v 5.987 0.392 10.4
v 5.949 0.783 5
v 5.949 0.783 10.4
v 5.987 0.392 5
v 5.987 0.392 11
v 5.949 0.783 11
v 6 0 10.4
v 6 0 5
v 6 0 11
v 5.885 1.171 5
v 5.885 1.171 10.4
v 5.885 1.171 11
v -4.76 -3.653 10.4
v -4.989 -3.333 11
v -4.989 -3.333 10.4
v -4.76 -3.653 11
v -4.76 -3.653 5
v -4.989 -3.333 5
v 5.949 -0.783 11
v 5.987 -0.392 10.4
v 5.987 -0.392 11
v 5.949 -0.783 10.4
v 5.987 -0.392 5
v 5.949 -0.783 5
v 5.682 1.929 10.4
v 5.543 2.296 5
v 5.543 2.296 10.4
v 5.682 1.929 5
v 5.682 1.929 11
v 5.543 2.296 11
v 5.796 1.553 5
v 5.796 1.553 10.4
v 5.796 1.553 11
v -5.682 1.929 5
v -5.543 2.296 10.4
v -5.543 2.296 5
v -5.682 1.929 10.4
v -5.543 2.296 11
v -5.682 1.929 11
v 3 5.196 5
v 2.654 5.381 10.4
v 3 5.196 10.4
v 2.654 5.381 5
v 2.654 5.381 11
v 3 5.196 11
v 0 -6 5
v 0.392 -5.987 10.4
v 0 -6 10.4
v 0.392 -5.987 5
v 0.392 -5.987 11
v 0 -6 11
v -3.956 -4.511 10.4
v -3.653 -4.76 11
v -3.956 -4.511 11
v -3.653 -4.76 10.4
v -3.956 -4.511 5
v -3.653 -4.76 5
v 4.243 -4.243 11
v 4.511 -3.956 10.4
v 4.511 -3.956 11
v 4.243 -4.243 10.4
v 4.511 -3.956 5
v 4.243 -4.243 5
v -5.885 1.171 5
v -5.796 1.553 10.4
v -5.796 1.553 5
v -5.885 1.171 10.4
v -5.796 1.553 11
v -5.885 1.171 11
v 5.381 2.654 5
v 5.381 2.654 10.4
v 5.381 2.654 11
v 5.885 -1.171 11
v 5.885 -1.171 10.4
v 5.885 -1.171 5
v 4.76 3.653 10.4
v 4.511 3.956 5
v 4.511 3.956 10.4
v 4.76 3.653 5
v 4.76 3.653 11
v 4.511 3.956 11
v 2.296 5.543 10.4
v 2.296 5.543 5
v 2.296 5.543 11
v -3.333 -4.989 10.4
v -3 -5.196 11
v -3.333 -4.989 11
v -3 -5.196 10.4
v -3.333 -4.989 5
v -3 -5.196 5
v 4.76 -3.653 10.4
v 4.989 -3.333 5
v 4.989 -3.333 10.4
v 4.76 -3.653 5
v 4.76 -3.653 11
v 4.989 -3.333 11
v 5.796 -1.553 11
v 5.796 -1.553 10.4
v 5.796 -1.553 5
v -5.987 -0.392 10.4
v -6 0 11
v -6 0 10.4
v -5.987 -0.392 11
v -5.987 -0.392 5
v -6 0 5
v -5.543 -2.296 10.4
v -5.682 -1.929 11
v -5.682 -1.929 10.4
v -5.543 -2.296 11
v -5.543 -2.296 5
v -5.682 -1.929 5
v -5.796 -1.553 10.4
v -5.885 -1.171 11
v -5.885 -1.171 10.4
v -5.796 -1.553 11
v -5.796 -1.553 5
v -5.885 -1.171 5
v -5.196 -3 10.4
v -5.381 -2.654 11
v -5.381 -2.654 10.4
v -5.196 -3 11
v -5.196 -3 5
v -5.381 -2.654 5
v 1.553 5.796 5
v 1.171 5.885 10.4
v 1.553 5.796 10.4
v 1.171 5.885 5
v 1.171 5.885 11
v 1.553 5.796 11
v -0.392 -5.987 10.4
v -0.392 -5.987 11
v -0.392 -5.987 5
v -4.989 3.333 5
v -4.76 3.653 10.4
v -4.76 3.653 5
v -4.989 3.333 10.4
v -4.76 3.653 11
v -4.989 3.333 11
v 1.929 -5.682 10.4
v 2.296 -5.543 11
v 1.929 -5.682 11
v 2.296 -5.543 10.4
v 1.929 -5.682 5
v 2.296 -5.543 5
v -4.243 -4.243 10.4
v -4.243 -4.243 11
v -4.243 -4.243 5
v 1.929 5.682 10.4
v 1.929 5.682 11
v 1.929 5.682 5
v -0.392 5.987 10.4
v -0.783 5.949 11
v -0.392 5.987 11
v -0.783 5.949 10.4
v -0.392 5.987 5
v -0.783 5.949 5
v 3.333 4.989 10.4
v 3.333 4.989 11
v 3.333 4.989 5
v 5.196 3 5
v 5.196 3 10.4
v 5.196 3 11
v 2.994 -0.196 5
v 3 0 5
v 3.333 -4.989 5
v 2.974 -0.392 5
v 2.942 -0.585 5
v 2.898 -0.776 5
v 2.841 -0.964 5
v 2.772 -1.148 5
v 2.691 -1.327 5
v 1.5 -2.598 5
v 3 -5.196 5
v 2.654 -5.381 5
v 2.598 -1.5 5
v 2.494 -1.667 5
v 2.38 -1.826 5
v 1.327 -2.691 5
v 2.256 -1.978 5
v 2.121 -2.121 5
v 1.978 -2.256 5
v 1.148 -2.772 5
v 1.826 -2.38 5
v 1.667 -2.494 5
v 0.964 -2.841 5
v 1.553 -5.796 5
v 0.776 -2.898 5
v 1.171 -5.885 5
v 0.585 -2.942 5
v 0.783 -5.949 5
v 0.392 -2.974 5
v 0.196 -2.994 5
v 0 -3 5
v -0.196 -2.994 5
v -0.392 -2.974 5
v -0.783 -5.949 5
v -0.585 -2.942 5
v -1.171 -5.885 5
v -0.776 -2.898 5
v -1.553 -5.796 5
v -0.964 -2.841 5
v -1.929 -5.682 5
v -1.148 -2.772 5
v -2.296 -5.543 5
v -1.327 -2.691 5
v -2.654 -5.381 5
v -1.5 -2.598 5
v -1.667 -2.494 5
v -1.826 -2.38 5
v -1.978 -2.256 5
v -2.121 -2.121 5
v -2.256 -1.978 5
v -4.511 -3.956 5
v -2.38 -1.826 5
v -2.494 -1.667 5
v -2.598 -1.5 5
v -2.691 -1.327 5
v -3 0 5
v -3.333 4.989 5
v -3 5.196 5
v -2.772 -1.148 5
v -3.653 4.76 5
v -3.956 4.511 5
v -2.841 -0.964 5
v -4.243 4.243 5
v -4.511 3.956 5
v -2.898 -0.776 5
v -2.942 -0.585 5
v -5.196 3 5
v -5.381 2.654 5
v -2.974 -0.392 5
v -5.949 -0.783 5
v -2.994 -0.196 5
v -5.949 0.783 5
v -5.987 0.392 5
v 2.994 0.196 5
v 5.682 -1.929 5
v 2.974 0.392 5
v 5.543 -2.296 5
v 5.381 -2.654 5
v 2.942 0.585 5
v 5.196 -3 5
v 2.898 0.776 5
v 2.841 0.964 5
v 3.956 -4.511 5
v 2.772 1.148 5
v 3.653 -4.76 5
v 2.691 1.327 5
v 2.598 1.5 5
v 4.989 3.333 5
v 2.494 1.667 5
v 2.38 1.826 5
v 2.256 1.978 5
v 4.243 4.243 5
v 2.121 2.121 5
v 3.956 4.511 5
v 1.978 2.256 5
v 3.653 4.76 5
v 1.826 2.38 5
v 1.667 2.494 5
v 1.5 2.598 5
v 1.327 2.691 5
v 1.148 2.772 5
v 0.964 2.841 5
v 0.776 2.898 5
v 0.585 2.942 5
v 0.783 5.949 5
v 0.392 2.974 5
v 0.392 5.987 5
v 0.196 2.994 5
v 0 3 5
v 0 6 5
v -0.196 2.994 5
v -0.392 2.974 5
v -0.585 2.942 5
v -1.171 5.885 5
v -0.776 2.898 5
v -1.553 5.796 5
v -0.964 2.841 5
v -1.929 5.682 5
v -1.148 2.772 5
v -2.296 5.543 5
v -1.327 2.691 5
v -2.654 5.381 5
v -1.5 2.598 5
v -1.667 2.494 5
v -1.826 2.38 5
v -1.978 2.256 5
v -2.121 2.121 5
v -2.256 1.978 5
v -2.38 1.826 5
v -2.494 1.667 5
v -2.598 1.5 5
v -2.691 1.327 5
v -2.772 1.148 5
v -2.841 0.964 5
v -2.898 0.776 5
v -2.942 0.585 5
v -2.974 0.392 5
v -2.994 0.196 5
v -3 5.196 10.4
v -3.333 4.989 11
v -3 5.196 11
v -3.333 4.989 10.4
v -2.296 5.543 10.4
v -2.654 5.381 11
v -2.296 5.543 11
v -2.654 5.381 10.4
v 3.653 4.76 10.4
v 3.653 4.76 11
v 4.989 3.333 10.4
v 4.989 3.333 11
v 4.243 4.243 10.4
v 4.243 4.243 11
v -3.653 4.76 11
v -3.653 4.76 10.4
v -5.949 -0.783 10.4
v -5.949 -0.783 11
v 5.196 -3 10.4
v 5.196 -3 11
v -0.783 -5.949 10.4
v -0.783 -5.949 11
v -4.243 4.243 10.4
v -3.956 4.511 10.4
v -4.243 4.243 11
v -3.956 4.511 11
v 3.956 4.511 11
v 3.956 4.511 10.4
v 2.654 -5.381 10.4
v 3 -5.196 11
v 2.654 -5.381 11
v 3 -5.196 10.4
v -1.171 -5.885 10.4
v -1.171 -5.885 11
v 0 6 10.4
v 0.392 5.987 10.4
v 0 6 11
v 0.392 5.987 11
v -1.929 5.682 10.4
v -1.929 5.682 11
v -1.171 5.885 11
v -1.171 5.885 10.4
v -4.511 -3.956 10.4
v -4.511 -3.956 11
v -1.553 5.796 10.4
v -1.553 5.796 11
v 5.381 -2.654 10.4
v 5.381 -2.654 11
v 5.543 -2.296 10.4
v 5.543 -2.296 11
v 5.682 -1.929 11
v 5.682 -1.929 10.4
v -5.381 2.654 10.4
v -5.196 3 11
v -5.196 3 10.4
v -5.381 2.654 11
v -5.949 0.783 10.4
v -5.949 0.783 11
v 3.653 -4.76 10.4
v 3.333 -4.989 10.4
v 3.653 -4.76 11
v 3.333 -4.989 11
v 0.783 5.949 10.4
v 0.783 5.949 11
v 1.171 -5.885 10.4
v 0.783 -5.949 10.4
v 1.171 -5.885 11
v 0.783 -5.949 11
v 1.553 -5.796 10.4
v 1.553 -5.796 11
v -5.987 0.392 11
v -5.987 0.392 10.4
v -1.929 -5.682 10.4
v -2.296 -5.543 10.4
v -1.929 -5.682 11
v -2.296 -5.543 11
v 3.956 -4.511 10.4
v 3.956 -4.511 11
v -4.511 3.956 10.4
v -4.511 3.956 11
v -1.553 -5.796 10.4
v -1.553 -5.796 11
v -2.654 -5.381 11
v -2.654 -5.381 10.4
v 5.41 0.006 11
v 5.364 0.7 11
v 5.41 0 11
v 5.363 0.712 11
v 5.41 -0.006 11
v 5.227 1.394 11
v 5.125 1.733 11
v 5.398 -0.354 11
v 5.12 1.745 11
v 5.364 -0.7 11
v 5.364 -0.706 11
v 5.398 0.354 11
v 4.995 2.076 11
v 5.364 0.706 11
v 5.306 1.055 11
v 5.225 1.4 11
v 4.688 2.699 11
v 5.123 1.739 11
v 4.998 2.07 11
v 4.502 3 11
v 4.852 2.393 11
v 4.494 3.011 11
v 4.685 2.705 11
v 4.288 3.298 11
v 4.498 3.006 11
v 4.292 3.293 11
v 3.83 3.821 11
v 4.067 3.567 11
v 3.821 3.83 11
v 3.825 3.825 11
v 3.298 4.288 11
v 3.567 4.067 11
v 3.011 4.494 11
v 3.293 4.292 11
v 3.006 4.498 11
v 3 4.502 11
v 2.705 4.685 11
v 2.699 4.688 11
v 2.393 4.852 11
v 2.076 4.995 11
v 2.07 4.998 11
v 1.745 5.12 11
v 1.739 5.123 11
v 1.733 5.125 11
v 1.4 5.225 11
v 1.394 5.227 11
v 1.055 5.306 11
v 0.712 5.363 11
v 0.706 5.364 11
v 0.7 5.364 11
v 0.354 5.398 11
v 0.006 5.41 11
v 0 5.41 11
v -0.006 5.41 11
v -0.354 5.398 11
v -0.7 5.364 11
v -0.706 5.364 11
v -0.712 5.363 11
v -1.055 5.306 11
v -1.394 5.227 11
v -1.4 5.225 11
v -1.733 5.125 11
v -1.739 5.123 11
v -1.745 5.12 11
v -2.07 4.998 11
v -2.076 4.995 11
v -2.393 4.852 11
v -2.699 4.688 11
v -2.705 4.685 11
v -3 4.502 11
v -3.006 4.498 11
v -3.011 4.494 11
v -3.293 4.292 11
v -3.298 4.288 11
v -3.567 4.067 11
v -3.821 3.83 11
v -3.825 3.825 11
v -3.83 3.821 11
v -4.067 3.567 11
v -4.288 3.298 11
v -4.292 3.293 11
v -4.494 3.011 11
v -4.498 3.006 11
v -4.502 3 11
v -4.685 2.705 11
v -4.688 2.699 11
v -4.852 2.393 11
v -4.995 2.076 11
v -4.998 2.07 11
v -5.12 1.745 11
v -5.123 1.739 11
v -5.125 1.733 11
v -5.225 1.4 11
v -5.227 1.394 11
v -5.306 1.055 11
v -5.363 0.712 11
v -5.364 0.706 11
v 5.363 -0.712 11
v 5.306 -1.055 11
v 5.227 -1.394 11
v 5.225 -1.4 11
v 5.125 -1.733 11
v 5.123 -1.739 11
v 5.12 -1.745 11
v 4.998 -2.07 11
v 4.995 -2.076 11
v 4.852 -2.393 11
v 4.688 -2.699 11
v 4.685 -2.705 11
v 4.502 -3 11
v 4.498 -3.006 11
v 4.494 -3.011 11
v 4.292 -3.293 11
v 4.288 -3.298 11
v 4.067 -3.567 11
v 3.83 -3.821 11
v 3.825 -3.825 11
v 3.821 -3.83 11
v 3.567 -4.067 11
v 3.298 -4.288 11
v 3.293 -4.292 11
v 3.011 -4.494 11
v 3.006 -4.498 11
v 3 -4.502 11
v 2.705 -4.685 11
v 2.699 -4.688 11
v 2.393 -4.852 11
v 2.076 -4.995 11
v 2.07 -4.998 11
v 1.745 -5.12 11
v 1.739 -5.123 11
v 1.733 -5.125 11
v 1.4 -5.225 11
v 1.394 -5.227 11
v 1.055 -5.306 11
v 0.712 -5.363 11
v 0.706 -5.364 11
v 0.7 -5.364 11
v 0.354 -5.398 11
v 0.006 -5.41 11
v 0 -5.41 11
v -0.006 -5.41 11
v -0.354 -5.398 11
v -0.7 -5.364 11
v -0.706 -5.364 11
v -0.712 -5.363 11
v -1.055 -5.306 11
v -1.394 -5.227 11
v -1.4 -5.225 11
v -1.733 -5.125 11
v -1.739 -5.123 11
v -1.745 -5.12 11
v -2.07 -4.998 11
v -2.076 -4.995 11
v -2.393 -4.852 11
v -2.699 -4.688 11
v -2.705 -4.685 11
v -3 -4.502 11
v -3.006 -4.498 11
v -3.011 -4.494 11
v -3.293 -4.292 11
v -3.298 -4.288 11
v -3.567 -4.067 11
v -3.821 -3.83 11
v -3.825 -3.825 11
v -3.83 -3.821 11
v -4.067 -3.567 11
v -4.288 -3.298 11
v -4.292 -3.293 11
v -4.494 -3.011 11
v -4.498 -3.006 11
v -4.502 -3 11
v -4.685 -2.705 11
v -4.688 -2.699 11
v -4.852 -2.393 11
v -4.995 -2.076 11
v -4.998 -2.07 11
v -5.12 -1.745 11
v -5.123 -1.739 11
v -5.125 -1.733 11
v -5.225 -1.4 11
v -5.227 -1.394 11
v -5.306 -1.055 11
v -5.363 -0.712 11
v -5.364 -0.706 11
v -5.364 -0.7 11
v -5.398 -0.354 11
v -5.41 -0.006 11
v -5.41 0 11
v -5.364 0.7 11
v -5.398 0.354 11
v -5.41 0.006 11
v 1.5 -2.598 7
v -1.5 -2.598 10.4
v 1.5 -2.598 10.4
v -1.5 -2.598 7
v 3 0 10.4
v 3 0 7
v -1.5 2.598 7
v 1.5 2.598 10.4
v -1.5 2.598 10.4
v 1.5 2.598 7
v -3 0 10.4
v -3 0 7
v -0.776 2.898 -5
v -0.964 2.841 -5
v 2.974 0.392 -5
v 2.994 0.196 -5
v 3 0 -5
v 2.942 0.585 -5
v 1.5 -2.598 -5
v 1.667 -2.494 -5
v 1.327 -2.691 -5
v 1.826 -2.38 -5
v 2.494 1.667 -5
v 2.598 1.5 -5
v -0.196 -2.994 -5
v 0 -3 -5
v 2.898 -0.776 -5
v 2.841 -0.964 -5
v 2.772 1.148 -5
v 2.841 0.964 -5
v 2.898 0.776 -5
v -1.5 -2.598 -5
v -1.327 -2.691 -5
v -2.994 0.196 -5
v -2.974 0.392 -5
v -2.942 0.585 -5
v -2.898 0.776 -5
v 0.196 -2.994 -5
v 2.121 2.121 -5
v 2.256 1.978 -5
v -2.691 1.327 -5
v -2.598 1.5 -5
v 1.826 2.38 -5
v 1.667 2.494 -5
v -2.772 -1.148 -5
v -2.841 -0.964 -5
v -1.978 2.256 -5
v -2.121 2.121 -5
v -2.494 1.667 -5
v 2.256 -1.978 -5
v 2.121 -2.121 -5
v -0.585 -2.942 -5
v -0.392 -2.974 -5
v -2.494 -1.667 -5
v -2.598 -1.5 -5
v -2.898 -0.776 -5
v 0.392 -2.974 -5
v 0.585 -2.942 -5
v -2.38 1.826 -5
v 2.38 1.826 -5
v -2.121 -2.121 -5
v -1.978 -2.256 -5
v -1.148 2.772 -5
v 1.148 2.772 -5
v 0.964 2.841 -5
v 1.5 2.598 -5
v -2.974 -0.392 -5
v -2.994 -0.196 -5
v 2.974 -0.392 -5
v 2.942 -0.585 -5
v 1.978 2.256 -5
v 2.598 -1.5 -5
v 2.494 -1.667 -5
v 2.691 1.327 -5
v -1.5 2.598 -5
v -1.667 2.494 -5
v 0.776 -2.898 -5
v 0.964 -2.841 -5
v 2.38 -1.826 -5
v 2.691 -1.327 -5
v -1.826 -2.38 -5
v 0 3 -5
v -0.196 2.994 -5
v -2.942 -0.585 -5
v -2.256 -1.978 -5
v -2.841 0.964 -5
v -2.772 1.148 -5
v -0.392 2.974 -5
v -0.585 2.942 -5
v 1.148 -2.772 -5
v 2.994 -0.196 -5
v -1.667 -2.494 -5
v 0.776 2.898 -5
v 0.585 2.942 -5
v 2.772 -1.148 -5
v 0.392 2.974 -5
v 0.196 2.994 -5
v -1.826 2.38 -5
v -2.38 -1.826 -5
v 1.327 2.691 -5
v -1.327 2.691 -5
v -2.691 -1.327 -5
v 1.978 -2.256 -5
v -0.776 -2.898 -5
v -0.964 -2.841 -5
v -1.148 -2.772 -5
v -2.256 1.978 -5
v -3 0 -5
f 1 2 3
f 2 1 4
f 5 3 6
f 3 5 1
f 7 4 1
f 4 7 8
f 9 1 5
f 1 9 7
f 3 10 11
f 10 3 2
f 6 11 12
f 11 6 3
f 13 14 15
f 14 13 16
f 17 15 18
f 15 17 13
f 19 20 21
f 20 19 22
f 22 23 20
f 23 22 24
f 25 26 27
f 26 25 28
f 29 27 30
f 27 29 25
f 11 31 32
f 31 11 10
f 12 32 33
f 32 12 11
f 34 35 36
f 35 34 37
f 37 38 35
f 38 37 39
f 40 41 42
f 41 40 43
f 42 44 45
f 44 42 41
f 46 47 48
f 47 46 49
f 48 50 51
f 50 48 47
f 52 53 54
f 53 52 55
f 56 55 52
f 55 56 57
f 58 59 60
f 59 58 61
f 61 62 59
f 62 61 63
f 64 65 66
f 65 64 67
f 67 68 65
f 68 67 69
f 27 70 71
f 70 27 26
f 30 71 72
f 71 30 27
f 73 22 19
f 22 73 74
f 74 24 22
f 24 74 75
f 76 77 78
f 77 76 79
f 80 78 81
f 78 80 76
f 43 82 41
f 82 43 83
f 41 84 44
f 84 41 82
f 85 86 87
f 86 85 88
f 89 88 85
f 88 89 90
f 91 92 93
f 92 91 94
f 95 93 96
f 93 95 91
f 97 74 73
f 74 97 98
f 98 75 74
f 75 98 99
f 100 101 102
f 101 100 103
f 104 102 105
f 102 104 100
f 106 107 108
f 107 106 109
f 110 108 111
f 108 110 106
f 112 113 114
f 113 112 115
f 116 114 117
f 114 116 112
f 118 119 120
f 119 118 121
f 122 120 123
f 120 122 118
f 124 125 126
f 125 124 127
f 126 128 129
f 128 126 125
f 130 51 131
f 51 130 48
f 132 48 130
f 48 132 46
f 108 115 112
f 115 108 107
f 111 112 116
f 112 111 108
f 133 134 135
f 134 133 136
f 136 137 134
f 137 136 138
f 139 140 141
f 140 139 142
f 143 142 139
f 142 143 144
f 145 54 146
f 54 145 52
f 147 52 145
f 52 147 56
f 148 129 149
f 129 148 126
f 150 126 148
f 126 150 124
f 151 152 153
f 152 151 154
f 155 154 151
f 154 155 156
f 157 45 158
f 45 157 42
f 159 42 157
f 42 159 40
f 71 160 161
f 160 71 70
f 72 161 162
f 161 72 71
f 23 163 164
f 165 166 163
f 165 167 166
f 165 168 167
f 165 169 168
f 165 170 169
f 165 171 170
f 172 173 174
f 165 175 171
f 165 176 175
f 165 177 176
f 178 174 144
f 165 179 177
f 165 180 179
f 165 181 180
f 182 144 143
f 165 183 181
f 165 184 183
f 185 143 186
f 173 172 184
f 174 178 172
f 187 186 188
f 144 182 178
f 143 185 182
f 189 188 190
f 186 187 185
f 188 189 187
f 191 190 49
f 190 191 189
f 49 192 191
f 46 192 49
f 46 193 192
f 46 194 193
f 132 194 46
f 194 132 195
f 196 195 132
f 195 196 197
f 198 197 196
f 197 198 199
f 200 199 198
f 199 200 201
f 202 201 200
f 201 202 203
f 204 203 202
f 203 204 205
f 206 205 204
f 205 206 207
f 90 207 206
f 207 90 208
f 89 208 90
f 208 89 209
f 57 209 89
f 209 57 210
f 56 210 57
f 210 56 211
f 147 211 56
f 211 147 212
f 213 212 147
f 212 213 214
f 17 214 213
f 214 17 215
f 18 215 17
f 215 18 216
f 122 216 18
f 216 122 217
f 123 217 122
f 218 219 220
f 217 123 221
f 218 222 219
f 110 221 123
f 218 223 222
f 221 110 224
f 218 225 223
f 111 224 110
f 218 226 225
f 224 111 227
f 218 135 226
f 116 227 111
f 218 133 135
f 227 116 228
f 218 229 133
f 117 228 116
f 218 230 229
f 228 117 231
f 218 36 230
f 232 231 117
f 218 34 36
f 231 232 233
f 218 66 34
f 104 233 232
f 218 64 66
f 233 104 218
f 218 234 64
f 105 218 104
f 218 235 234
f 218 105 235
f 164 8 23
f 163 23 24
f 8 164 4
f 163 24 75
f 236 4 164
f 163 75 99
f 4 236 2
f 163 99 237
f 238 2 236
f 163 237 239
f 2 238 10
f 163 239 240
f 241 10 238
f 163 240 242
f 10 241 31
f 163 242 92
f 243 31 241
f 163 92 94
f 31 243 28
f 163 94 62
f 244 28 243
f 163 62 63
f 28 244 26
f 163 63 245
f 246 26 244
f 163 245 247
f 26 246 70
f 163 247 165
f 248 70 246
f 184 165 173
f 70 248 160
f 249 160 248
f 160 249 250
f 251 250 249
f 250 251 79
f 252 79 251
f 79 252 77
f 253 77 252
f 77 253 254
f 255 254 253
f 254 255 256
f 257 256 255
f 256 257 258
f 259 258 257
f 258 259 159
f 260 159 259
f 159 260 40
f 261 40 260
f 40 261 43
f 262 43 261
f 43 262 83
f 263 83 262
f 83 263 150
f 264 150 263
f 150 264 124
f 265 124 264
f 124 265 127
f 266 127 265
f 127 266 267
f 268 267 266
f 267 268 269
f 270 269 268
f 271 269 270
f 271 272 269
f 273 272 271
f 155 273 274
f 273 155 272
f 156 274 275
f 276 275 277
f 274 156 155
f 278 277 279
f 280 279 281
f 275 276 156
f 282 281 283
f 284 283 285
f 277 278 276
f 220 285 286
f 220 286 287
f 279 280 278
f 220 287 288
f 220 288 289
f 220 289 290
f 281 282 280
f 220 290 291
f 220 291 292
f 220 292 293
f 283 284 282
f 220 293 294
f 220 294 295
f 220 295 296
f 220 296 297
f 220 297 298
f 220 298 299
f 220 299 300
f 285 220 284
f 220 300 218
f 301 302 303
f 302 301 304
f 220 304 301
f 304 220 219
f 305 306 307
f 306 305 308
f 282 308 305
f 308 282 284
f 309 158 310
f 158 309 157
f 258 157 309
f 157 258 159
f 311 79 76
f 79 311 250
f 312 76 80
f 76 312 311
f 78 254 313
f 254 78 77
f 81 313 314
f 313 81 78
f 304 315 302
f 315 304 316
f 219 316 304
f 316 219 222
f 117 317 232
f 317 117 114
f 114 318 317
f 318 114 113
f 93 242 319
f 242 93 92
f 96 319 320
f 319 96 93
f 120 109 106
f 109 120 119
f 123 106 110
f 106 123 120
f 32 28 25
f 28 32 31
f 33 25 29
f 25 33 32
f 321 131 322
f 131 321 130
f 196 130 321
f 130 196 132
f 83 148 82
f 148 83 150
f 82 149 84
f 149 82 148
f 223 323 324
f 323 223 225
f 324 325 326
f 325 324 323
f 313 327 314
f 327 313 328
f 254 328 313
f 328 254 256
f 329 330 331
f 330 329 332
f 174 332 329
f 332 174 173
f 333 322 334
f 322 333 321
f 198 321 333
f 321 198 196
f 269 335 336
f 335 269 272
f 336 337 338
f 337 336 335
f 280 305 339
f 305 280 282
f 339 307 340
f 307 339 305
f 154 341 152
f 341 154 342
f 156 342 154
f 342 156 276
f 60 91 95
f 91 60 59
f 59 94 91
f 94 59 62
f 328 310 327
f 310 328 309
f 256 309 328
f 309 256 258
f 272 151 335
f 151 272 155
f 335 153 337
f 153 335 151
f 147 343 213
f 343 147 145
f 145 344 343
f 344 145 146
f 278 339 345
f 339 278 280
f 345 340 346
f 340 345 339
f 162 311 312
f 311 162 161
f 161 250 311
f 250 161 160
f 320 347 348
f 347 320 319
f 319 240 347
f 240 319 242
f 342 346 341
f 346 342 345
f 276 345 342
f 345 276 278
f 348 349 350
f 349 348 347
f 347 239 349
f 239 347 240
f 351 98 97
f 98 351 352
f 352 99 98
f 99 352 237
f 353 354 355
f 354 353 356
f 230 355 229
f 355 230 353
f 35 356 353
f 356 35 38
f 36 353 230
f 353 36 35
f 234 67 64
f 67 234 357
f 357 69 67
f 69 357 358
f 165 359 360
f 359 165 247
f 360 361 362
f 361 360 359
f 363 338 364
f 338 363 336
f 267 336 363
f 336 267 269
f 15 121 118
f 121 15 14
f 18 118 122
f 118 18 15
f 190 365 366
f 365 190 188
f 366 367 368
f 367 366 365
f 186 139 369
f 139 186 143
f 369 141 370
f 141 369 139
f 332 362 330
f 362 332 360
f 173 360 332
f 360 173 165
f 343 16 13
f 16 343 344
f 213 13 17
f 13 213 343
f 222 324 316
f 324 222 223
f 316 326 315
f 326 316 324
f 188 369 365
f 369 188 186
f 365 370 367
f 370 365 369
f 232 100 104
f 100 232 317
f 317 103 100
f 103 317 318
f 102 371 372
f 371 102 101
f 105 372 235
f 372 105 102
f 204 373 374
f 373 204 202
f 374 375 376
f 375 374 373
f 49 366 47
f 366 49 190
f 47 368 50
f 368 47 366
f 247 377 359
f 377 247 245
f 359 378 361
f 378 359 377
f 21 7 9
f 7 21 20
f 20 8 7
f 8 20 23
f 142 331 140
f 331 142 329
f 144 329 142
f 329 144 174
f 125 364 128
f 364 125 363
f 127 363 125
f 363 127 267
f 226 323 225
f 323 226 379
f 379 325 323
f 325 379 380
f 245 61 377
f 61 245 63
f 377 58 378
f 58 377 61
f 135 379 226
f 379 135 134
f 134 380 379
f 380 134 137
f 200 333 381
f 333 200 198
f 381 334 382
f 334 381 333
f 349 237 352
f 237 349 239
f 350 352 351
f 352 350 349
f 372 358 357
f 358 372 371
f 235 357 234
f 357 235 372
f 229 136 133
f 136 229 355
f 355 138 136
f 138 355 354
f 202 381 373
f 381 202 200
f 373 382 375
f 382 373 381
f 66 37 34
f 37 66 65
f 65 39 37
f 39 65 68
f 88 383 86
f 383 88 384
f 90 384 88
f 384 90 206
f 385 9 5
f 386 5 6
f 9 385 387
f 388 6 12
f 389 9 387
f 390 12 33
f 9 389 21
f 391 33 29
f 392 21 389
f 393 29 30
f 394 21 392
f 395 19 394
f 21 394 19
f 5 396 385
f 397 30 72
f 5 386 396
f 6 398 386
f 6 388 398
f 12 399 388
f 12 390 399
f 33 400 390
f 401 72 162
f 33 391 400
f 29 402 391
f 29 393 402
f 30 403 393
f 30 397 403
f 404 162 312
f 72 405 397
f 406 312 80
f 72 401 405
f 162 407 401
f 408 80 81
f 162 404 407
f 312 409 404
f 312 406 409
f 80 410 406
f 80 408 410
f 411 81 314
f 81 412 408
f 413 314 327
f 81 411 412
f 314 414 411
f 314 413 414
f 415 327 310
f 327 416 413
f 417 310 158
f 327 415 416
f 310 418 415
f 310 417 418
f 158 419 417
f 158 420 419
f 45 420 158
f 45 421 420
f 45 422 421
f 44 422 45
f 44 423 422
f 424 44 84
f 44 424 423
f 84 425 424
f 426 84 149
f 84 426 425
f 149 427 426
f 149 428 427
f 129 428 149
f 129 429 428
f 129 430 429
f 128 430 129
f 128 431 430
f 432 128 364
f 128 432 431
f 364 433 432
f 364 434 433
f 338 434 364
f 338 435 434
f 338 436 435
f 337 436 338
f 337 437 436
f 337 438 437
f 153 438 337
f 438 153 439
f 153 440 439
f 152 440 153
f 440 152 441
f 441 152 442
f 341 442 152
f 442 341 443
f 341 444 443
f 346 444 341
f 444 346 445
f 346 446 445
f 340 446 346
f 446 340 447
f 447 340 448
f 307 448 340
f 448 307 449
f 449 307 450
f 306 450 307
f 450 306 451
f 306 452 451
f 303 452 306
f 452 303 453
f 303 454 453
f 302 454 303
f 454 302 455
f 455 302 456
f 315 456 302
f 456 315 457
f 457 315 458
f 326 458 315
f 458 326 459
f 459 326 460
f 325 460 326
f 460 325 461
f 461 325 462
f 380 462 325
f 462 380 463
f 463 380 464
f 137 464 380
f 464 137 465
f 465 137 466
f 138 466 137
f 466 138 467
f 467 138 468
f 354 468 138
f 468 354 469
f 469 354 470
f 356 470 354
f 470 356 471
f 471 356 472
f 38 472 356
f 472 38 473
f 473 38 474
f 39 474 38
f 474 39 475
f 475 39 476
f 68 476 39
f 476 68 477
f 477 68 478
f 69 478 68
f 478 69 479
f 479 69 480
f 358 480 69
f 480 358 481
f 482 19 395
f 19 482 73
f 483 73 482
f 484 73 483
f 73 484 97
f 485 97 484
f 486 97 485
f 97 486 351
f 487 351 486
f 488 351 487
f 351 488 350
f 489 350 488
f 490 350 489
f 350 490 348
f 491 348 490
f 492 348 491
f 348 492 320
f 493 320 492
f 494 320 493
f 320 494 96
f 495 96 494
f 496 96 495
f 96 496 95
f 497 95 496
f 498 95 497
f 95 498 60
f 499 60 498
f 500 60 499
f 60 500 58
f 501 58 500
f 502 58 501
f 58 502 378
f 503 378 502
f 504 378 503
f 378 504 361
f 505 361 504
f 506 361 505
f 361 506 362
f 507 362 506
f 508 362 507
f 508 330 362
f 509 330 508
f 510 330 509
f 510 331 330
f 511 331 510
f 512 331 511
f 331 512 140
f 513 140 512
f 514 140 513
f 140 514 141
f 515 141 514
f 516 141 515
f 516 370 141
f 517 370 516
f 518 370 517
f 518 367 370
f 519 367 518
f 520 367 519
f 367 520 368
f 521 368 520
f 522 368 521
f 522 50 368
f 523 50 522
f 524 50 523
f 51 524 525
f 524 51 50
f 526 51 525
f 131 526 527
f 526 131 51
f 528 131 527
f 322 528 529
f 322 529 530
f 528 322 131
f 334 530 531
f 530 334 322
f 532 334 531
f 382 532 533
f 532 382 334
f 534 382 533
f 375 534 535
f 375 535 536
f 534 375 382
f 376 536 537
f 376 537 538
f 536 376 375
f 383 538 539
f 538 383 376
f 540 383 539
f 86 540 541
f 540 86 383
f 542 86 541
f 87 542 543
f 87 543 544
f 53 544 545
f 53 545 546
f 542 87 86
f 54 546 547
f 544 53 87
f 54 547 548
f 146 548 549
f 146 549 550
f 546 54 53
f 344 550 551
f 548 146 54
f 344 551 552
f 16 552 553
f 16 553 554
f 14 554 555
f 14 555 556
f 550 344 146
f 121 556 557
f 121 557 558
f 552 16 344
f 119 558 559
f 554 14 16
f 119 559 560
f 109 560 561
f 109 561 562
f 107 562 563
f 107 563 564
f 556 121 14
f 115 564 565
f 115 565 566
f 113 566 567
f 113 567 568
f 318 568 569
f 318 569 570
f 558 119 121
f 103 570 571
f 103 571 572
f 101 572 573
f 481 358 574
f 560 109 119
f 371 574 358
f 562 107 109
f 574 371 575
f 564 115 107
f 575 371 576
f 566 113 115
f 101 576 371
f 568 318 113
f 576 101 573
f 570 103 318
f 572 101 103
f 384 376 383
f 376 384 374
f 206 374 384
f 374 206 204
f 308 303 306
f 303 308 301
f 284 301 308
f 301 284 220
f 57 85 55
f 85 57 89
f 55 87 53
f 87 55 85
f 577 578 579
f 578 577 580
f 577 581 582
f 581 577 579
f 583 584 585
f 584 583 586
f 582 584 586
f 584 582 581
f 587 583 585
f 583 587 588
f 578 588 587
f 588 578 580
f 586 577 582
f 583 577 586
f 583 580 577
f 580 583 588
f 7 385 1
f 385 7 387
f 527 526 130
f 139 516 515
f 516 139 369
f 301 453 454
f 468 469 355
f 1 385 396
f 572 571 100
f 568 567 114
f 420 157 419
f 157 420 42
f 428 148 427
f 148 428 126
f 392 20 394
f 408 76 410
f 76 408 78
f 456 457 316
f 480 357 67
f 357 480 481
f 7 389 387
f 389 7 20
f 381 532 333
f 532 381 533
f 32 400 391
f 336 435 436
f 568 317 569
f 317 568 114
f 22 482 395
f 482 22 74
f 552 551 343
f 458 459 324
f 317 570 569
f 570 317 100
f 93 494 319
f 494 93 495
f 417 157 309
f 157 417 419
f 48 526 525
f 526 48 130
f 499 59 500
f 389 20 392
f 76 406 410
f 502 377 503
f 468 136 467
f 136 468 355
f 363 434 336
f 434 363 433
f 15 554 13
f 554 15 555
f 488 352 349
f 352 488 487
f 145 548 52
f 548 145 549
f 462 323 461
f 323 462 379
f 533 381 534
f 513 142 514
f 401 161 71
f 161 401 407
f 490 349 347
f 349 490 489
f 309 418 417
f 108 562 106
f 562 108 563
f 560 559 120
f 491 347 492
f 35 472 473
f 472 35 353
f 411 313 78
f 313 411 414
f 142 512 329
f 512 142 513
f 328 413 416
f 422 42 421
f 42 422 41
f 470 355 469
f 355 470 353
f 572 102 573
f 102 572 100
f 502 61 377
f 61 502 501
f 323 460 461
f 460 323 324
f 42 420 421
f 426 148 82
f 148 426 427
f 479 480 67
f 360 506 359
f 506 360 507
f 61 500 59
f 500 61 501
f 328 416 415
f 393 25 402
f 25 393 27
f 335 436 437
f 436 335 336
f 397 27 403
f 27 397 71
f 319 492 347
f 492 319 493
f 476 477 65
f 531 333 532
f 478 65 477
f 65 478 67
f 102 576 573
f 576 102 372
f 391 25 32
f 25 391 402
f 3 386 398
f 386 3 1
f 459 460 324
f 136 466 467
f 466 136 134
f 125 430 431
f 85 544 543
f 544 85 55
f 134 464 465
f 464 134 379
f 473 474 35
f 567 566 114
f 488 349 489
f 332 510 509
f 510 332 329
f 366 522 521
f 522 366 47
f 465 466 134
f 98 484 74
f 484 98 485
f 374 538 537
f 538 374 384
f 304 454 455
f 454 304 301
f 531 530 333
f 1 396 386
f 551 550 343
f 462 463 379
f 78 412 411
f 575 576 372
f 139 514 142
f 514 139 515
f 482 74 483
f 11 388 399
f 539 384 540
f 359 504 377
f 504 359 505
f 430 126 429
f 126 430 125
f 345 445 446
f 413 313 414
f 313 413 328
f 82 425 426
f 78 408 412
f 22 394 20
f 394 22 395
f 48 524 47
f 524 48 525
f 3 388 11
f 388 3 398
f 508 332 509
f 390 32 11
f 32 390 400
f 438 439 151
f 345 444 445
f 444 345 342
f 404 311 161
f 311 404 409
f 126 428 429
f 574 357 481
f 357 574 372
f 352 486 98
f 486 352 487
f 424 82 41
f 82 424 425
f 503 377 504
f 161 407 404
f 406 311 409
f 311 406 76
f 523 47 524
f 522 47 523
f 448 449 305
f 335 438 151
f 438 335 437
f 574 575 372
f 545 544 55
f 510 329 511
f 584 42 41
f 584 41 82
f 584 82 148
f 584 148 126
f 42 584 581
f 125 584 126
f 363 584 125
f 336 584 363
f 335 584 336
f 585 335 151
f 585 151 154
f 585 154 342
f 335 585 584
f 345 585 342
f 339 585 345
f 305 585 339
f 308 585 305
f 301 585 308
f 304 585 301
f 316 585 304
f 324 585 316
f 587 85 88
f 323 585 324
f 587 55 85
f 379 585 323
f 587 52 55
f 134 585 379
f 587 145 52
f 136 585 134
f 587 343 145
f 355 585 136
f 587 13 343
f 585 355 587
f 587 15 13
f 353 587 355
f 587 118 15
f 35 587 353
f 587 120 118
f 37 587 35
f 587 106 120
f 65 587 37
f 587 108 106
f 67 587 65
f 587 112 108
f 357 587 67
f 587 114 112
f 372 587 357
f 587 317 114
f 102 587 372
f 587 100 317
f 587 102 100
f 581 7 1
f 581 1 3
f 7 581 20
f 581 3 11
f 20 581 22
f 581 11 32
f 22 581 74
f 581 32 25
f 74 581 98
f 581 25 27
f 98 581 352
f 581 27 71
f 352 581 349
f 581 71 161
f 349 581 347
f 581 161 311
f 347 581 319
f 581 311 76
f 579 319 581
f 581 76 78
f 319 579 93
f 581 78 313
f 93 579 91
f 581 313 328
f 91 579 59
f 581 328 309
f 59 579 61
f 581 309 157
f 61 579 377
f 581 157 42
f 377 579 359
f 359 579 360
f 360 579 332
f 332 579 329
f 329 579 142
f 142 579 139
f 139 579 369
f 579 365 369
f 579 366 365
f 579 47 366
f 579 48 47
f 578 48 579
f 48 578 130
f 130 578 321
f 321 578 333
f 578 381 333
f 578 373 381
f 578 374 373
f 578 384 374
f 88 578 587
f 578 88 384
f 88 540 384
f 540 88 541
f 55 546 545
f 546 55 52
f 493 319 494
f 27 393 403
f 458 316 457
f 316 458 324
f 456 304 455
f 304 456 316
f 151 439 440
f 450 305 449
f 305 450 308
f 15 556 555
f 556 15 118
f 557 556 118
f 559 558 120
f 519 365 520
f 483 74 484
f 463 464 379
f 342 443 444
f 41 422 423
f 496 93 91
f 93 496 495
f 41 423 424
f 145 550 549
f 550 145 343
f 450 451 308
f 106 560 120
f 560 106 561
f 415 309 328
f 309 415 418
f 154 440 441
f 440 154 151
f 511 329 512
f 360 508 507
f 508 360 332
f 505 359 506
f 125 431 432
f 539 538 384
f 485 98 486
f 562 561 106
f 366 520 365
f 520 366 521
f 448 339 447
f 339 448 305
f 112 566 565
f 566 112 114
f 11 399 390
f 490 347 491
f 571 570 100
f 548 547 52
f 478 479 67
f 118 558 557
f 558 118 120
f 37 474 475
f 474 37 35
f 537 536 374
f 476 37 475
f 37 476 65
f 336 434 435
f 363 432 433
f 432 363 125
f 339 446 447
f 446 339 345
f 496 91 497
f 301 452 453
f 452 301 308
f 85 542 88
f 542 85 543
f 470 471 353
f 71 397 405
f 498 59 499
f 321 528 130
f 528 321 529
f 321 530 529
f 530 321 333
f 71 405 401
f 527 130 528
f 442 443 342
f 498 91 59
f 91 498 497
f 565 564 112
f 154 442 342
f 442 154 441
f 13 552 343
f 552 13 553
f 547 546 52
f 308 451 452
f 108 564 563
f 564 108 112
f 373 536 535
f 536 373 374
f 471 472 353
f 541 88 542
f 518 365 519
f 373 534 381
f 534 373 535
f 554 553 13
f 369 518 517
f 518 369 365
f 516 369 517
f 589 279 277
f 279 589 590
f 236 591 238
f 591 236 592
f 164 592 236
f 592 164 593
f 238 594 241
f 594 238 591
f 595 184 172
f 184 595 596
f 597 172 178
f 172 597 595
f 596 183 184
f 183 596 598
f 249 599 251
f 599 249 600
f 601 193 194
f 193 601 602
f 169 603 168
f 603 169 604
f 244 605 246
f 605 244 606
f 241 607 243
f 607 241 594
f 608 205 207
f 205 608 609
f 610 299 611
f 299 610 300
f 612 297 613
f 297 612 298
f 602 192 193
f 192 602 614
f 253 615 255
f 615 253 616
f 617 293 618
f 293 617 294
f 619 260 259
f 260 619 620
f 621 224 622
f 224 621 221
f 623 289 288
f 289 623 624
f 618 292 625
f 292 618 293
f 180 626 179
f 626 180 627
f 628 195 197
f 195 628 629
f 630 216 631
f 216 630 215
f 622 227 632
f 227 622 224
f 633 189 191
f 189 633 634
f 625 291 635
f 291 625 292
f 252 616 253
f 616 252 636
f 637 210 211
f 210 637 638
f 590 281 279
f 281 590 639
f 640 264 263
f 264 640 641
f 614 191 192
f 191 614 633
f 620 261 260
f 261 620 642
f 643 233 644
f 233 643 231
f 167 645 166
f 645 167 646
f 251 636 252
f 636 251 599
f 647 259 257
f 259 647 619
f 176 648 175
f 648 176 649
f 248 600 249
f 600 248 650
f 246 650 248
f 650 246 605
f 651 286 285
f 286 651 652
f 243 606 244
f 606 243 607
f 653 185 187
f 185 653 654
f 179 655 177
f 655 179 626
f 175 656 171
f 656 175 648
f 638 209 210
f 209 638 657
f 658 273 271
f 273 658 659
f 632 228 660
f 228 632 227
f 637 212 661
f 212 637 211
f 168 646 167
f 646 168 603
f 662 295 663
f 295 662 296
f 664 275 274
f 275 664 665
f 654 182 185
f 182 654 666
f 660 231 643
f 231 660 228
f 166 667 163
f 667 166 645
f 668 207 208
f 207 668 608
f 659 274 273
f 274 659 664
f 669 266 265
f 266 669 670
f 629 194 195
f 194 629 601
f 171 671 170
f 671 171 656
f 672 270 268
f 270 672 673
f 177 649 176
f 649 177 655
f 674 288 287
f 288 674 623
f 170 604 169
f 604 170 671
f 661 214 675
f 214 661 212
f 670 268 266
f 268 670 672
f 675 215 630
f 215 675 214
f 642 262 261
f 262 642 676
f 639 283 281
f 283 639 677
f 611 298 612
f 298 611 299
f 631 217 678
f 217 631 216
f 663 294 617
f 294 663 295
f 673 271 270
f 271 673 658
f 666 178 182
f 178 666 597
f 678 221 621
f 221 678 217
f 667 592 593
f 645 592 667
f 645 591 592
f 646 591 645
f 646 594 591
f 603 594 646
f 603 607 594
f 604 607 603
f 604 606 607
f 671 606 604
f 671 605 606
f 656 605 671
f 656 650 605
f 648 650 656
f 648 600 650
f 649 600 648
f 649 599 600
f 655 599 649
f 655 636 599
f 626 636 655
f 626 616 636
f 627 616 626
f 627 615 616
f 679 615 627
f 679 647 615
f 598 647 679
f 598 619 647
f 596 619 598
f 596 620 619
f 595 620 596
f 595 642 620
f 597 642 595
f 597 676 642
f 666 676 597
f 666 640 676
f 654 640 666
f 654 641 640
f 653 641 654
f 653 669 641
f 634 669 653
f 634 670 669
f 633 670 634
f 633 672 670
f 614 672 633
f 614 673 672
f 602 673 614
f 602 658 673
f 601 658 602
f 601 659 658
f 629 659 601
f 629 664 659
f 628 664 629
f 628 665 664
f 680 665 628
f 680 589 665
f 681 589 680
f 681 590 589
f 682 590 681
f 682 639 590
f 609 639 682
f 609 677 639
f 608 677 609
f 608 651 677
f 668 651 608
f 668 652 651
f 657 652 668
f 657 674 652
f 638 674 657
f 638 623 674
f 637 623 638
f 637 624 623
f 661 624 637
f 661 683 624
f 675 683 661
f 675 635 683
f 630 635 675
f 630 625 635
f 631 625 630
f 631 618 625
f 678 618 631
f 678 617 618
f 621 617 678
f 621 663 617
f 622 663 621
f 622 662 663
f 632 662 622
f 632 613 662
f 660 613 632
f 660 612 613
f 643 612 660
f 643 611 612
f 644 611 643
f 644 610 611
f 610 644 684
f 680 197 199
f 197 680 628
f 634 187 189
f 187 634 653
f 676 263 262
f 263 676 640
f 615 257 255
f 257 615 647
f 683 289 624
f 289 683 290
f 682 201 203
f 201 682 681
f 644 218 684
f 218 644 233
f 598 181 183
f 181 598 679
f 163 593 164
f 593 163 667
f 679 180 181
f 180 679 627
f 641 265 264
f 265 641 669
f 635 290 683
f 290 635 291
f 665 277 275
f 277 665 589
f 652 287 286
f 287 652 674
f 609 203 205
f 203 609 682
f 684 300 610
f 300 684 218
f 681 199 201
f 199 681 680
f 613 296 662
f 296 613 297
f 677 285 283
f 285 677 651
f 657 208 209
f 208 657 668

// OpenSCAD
$fn=96;

module socket_head_cap_screw(d=6, head_d=12, length=10, head_h=6, socket_d=6, socket_depth=4, chamfer=0.6) {
    union() {
        // Shank
        translate([0,0,-length/2])
            cylinder(h=length, d=d);

        // Head
        translate([0,0,length/2])
            difference() {
                cylinder(h=head_h, d=head_d);
                // Hex socket
                translate([0,0,head_h - socket_depth])
                    cylinder(h=socket_depth + 0.2, d=socket_d, $fn=6);
                // Top chamfer
                translate([0,0,head_h - chamfer])
                    cylinder(h=chamfer + 0.01, d1=head_d, d2=head_d - 2*chamfer);
            }
    }
}

socket_head_cap_screw(d=6, head_d=12, length=10, head_h=6, socket_d=6, socket_depth=4, chamfer=0.6);
